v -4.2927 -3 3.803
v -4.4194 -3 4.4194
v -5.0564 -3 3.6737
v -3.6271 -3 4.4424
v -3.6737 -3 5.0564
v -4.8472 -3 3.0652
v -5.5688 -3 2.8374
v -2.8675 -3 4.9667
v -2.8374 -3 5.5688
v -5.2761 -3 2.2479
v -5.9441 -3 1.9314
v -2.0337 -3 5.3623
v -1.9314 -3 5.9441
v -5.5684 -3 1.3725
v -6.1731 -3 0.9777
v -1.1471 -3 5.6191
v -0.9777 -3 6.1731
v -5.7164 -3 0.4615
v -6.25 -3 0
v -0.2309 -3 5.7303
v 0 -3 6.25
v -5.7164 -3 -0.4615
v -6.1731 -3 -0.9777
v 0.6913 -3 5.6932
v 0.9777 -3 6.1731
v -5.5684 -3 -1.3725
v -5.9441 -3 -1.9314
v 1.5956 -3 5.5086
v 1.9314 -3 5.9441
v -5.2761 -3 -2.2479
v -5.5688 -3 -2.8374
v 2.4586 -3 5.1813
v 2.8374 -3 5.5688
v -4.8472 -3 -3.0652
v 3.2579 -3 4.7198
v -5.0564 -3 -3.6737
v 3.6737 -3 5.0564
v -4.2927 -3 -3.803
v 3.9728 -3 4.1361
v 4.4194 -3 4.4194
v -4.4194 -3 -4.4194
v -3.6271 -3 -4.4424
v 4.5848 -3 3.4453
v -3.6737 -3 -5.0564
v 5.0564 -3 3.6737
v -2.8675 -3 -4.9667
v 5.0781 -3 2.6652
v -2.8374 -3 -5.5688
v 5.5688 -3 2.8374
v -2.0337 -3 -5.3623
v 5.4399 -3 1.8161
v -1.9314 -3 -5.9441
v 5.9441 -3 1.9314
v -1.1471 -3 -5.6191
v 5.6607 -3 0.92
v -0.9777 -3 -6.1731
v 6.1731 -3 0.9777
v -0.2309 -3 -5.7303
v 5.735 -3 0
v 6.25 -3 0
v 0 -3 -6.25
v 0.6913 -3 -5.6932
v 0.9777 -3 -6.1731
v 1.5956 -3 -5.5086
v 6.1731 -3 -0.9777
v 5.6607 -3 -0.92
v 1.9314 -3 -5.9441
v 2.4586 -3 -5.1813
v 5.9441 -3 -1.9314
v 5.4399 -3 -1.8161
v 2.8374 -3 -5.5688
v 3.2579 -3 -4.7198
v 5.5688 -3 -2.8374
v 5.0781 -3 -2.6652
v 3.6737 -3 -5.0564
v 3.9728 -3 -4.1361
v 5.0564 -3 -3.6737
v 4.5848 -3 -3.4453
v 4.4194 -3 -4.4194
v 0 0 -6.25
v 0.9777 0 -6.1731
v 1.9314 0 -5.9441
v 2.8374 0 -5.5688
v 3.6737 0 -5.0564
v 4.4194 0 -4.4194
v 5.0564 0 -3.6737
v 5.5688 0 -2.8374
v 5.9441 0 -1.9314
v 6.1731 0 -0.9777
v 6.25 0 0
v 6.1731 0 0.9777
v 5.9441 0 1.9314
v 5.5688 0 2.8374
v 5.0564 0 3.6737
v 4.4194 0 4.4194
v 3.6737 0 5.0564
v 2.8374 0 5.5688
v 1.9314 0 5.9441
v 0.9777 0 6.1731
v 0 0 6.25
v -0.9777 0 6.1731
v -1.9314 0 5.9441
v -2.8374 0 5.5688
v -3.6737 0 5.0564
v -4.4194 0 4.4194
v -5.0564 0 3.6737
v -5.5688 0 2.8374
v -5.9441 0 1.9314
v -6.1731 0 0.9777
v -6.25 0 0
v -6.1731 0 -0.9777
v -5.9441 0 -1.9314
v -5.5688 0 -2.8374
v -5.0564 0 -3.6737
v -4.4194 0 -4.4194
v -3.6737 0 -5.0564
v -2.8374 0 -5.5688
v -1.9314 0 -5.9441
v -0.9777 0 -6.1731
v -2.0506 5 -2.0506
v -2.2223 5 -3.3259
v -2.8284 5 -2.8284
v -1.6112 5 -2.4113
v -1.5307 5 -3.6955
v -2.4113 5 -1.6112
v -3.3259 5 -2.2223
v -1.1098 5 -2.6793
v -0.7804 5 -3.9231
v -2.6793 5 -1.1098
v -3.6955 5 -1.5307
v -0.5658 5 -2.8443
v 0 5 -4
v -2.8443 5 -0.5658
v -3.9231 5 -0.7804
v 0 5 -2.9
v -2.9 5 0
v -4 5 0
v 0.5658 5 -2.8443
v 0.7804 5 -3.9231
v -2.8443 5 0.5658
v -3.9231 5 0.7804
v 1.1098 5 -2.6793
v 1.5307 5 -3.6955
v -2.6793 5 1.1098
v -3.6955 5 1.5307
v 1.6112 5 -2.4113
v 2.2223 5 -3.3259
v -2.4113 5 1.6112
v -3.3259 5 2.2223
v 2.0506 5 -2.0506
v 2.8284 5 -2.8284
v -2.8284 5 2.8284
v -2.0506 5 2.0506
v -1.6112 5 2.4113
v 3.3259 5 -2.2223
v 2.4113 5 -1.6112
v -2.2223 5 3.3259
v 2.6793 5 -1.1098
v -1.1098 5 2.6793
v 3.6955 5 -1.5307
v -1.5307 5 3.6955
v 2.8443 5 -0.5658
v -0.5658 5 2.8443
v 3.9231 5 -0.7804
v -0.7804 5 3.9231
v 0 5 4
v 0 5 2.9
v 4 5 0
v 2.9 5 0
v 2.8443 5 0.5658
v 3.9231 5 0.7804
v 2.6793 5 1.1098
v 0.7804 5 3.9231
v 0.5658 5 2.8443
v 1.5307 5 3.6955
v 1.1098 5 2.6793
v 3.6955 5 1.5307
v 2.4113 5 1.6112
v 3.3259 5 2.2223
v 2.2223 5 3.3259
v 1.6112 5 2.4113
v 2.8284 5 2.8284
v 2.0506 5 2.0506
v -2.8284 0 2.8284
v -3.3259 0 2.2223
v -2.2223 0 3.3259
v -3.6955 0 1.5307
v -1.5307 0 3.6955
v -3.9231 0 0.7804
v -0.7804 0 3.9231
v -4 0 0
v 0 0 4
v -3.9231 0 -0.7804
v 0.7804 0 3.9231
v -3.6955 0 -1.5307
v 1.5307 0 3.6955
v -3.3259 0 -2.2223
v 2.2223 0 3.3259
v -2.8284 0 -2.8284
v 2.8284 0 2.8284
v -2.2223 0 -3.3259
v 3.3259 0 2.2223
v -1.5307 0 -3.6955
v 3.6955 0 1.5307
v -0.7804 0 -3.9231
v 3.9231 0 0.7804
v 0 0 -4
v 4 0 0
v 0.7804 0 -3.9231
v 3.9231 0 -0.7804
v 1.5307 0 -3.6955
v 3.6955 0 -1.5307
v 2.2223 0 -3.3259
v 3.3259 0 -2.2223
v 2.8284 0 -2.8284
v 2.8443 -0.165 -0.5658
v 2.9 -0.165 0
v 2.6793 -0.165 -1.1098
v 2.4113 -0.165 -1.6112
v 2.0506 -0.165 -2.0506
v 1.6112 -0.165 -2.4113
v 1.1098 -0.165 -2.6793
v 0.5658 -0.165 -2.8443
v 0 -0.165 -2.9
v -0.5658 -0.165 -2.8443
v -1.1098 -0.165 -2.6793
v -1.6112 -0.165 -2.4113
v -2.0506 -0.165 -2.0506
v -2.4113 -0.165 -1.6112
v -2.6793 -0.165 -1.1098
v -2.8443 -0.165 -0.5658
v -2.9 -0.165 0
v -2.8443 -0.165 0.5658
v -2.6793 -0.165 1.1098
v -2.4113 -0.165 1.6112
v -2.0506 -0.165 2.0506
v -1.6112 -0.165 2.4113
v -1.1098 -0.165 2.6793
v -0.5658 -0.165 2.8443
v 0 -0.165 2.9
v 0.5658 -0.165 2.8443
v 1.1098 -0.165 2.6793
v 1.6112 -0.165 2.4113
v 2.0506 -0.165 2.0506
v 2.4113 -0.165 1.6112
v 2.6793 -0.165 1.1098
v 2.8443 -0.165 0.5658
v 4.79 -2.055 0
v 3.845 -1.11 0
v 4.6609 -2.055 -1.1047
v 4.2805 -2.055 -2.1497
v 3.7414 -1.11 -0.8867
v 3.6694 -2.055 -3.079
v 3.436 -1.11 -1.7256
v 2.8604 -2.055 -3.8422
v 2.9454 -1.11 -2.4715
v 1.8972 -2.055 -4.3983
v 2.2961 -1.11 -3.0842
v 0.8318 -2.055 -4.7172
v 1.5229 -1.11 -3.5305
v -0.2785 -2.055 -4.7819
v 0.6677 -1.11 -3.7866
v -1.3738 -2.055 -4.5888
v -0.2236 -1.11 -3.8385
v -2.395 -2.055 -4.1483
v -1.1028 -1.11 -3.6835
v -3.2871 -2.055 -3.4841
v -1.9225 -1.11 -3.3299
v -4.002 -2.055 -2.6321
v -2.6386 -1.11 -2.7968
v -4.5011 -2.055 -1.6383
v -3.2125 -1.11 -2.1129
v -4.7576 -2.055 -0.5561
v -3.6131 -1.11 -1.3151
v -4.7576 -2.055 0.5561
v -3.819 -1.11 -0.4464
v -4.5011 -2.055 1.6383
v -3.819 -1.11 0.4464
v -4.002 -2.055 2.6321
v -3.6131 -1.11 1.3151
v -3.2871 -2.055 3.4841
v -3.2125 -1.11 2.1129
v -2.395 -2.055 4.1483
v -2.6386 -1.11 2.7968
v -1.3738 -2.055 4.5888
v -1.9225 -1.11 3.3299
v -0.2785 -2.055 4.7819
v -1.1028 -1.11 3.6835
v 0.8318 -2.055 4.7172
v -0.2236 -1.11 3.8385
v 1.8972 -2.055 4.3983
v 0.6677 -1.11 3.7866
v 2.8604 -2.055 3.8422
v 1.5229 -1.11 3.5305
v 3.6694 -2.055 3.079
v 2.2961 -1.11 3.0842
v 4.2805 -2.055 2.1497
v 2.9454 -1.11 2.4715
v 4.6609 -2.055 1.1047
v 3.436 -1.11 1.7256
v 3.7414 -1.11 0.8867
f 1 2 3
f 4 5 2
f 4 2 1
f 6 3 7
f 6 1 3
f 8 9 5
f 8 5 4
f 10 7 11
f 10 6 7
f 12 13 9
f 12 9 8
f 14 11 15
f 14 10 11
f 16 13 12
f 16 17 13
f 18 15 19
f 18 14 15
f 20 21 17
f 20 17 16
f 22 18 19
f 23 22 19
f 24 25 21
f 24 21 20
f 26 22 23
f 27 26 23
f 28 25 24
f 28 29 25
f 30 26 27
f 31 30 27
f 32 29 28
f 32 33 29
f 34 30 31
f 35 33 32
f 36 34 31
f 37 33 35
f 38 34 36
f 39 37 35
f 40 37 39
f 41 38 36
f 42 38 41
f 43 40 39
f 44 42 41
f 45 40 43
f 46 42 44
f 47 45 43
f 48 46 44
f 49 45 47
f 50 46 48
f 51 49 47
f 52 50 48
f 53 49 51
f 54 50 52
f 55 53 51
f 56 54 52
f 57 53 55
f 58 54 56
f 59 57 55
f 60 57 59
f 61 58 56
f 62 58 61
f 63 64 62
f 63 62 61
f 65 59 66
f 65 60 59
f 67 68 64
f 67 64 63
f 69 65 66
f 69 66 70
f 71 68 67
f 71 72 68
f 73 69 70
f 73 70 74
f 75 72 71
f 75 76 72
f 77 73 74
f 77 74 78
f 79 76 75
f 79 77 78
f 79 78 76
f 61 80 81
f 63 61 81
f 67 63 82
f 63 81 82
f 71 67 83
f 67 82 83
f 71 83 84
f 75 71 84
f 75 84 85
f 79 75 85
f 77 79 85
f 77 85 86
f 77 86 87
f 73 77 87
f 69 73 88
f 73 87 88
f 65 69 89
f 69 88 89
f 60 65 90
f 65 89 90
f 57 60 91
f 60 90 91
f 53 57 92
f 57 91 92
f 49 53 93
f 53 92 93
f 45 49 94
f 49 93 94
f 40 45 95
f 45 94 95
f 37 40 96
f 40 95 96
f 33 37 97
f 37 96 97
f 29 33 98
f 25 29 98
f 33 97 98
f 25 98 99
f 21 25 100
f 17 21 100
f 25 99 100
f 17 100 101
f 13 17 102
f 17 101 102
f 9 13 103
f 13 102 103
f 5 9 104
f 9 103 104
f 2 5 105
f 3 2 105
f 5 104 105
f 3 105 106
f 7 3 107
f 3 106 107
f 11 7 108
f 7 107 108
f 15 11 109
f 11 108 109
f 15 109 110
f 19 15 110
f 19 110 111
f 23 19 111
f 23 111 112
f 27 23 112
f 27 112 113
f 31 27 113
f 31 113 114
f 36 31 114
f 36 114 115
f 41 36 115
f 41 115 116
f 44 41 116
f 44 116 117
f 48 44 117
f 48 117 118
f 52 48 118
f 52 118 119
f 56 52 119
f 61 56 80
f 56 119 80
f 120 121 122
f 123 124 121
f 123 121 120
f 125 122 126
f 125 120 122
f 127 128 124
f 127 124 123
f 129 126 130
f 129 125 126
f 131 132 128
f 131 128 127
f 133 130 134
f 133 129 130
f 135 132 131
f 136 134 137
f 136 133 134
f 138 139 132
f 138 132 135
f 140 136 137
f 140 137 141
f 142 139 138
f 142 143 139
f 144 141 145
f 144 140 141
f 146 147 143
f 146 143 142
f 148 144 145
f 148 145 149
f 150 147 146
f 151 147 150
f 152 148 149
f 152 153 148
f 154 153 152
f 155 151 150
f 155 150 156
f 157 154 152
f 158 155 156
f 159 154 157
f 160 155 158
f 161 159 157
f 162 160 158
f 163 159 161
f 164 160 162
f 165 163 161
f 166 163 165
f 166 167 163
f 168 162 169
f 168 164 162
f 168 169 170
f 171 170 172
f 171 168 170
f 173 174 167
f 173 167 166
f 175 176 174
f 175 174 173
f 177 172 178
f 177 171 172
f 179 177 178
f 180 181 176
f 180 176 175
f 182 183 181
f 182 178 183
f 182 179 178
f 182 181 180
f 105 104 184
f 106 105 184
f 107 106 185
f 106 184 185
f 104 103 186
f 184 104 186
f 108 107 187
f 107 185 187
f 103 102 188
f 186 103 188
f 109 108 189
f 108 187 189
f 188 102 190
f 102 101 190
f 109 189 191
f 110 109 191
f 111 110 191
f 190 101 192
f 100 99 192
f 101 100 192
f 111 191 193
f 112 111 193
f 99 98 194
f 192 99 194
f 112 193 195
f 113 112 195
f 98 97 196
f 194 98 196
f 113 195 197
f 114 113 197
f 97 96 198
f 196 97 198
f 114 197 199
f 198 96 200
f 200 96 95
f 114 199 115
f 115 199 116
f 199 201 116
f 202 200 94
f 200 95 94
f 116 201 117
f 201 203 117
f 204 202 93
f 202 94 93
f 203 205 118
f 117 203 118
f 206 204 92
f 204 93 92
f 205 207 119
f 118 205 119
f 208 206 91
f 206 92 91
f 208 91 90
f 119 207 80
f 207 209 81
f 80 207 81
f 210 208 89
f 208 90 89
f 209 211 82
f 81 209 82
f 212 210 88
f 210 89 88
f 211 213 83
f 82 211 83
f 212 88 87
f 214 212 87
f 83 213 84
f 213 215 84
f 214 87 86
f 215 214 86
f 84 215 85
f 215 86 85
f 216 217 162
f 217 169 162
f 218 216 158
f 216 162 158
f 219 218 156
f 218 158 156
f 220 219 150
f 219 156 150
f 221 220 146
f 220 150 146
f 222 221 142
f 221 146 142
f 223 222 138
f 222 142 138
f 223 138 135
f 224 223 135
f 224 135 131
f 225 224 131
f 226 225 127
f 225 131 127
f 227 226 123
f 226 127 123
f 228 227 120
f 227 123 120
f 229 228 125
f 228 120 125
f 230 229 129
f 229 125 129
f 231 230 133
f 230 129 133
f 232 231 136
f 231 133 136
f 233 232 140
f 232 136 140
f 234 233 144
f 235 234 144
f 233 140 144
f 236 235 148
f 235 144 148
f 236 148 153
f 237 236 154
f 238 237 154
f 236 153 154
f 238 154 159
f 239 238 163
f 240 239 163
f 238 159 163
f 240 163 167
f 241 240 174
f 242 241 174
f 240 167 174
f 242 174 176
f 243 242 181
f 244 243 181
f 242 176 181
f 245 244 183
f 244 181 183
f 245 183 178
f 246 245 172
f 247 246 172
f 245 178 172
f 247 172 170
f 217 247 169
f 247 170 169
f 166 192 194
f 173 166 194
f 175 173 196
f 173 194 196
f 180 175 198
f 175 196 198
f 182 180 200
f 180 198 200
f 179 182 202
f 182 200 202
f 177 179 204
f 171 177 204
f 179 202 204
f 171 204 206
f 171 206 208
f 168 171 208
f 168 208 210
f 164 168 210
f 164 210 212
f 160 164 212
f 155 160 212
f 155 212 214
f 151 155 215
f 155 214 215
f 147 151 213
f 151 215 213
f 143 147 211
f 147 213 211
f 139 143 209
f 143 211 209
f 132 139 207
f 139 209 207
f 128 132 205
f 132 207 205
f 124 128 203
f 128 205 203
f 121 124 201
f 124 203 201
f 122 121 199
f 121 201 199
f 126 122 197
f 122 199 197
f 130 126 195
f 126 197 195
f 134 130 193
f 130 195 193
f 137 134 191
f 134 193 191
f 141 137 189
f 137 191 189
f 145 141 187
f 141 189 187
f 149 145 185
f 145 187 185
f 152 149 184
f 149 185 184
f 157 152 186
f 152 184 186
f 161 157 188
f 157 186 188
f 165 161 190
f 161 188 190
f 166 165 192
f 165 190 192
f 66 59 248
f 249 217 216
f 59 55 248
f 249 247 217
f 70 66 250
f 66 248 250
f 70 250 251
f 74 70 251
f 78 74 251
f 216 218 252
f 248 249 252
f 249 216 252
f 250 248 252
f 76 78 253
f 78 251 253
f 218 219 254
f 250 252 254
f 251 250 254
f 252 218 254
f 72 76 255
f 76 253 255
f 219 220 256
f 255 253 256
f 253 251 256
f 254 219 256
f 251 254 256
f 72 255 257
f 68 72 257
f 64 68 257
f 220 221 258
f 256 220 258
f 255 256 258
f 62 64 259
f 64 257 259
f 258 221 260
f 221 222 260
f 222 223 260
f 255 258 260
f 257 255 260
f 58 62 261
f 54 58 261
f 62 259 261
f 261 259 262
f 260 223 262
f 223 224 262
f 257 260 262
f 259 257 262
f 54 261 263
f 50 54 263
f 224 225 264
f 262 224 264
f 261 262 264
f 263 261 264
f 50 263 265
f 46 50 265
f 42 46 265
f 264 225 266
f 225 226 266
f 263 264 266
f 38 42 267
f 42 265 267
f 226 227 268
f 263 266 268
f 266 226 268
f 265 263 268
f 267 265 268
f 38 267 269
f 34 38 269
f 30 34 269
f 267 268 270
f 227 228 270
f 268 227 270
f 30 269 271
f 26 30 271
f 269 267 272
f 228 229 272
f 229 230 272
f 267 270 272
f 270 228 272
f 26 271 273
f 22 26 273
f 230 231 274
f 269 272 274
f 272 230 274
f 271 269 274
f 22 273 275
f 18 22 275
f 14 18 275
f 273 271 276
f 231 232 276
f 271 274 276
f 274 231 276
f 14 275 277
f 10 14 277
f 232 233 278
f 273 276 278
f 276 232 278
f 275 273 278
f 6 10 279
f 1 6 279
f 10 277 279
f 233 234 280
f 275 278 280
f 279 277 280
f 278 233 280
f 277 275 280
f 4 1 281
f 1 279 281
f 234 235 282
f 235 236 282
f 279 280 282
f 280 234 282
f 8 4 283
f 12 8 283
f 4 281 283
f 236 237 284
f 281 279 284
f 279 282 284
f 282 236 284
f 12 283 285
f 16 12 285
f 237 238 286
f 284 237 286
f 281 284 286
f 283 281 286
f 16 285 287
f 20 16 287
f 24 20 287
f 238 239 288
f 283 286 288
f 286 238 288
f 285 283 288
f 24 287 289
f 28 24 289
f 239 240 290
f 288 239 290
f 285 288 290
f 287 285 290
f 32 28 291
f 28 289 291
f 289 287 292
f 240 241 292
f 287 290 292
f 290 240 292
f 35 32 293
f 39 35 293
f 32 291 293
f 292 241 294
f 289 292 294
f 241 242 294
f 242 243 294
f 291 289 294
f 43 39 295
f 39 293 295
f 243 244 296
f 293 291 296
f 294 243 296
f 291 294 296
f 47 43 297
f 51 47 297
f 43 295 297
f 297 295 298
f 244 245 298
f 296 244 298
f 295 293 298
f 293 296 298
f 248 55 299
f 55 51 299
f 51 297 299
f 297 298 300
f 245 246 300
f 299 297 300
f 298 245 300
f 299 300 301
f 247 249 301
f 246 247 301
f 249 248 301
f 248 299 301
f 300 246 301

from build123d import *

# Parameters (mm, degrees)
SKETCH1_R                                            = 4
BOSS_EXTRUDE1_DEPTH                                  = 5
SKETCH2_R                                            = 6.25
BOSS_EXTRUDE2_DEPTH                                  = 3
SKETCH3_R                                            = 2.8
CUT_EXTRUDE1_DEPTH                                   = 12.921619018
CSK_FOR_M5_HEX_SOCKET_COUNTERSUNK_HEAD_S_D           = 5.8
CSK_FOR_M5_HEX_SOCKET_COUNTERSUNK_HEAD_S_CSINK_D     = 11.47
CSK_FOR_M5_HEX_SOCKET_COUNTERSUNK_HEAD_S_CSINK_ANGLE = 90


with BuildPart() as part:
    # Sketch1 → Boss-Extrude1 (new body)
    with BuildSketch(Plane(origin=(0, 0, 0), x_dir=(1, 0, 0), z_dir=(0, 1, 0))):
        with Locations(Location((0, 0, 0), (0, 0, 270))):
            Circle(SKETCH1_R)
    extrude(amount=BOSS_EXTRUDE1_DEPTH)

    # Sketch2 → Boss-Extrude2 (add)
    with BuildSketch(Plane.XZ):
        with Locations(Location((0, 0, 0), (0, 0, 270))):
            Circle(SKETCH2_R)
    extrude(amount=BOSS_EXTRUDE2_DEPTH)

    # Sketch3 → Cut-Extrude1 (cut, through all)
    with BuildSketch(Plane(origin=(0, 5, 0), x_dir=(1, 0, 0), z_dir=(0, 1, 0))):
        with Locations(Location((0, 0, 0), (0, 0, 270))):
            Circle(SKETCH3_R)
    extrude(amount=-CUT_EXTRUDE1_DEPTH, mode=Mode.SUBTRACT)

    # CSK for M5 Hex Socket Countersunk Head Screw1 (through all)
    with Locations(Plane(origin=(0, -3, 0), x_dir=(-1, 0, 0), z_dir=(0, -1, 0))):
        with Locations((0, 0)):
            CounterSinkHole(CSK_FOR_M5_HEX_SOCKET_COUNTERSUNK_HEAD_S_D / 2, CSK_FOR_M5_HEX_SOCKET_COUNTERSUNK_HEAD_S_CSINK_D / 2, counter_sink_angle=CSK_FOR_M5_HEX_SOCKET_COUNTERSUNK_HEAD_S_CSINK_ANGLE)


solid = part.part
